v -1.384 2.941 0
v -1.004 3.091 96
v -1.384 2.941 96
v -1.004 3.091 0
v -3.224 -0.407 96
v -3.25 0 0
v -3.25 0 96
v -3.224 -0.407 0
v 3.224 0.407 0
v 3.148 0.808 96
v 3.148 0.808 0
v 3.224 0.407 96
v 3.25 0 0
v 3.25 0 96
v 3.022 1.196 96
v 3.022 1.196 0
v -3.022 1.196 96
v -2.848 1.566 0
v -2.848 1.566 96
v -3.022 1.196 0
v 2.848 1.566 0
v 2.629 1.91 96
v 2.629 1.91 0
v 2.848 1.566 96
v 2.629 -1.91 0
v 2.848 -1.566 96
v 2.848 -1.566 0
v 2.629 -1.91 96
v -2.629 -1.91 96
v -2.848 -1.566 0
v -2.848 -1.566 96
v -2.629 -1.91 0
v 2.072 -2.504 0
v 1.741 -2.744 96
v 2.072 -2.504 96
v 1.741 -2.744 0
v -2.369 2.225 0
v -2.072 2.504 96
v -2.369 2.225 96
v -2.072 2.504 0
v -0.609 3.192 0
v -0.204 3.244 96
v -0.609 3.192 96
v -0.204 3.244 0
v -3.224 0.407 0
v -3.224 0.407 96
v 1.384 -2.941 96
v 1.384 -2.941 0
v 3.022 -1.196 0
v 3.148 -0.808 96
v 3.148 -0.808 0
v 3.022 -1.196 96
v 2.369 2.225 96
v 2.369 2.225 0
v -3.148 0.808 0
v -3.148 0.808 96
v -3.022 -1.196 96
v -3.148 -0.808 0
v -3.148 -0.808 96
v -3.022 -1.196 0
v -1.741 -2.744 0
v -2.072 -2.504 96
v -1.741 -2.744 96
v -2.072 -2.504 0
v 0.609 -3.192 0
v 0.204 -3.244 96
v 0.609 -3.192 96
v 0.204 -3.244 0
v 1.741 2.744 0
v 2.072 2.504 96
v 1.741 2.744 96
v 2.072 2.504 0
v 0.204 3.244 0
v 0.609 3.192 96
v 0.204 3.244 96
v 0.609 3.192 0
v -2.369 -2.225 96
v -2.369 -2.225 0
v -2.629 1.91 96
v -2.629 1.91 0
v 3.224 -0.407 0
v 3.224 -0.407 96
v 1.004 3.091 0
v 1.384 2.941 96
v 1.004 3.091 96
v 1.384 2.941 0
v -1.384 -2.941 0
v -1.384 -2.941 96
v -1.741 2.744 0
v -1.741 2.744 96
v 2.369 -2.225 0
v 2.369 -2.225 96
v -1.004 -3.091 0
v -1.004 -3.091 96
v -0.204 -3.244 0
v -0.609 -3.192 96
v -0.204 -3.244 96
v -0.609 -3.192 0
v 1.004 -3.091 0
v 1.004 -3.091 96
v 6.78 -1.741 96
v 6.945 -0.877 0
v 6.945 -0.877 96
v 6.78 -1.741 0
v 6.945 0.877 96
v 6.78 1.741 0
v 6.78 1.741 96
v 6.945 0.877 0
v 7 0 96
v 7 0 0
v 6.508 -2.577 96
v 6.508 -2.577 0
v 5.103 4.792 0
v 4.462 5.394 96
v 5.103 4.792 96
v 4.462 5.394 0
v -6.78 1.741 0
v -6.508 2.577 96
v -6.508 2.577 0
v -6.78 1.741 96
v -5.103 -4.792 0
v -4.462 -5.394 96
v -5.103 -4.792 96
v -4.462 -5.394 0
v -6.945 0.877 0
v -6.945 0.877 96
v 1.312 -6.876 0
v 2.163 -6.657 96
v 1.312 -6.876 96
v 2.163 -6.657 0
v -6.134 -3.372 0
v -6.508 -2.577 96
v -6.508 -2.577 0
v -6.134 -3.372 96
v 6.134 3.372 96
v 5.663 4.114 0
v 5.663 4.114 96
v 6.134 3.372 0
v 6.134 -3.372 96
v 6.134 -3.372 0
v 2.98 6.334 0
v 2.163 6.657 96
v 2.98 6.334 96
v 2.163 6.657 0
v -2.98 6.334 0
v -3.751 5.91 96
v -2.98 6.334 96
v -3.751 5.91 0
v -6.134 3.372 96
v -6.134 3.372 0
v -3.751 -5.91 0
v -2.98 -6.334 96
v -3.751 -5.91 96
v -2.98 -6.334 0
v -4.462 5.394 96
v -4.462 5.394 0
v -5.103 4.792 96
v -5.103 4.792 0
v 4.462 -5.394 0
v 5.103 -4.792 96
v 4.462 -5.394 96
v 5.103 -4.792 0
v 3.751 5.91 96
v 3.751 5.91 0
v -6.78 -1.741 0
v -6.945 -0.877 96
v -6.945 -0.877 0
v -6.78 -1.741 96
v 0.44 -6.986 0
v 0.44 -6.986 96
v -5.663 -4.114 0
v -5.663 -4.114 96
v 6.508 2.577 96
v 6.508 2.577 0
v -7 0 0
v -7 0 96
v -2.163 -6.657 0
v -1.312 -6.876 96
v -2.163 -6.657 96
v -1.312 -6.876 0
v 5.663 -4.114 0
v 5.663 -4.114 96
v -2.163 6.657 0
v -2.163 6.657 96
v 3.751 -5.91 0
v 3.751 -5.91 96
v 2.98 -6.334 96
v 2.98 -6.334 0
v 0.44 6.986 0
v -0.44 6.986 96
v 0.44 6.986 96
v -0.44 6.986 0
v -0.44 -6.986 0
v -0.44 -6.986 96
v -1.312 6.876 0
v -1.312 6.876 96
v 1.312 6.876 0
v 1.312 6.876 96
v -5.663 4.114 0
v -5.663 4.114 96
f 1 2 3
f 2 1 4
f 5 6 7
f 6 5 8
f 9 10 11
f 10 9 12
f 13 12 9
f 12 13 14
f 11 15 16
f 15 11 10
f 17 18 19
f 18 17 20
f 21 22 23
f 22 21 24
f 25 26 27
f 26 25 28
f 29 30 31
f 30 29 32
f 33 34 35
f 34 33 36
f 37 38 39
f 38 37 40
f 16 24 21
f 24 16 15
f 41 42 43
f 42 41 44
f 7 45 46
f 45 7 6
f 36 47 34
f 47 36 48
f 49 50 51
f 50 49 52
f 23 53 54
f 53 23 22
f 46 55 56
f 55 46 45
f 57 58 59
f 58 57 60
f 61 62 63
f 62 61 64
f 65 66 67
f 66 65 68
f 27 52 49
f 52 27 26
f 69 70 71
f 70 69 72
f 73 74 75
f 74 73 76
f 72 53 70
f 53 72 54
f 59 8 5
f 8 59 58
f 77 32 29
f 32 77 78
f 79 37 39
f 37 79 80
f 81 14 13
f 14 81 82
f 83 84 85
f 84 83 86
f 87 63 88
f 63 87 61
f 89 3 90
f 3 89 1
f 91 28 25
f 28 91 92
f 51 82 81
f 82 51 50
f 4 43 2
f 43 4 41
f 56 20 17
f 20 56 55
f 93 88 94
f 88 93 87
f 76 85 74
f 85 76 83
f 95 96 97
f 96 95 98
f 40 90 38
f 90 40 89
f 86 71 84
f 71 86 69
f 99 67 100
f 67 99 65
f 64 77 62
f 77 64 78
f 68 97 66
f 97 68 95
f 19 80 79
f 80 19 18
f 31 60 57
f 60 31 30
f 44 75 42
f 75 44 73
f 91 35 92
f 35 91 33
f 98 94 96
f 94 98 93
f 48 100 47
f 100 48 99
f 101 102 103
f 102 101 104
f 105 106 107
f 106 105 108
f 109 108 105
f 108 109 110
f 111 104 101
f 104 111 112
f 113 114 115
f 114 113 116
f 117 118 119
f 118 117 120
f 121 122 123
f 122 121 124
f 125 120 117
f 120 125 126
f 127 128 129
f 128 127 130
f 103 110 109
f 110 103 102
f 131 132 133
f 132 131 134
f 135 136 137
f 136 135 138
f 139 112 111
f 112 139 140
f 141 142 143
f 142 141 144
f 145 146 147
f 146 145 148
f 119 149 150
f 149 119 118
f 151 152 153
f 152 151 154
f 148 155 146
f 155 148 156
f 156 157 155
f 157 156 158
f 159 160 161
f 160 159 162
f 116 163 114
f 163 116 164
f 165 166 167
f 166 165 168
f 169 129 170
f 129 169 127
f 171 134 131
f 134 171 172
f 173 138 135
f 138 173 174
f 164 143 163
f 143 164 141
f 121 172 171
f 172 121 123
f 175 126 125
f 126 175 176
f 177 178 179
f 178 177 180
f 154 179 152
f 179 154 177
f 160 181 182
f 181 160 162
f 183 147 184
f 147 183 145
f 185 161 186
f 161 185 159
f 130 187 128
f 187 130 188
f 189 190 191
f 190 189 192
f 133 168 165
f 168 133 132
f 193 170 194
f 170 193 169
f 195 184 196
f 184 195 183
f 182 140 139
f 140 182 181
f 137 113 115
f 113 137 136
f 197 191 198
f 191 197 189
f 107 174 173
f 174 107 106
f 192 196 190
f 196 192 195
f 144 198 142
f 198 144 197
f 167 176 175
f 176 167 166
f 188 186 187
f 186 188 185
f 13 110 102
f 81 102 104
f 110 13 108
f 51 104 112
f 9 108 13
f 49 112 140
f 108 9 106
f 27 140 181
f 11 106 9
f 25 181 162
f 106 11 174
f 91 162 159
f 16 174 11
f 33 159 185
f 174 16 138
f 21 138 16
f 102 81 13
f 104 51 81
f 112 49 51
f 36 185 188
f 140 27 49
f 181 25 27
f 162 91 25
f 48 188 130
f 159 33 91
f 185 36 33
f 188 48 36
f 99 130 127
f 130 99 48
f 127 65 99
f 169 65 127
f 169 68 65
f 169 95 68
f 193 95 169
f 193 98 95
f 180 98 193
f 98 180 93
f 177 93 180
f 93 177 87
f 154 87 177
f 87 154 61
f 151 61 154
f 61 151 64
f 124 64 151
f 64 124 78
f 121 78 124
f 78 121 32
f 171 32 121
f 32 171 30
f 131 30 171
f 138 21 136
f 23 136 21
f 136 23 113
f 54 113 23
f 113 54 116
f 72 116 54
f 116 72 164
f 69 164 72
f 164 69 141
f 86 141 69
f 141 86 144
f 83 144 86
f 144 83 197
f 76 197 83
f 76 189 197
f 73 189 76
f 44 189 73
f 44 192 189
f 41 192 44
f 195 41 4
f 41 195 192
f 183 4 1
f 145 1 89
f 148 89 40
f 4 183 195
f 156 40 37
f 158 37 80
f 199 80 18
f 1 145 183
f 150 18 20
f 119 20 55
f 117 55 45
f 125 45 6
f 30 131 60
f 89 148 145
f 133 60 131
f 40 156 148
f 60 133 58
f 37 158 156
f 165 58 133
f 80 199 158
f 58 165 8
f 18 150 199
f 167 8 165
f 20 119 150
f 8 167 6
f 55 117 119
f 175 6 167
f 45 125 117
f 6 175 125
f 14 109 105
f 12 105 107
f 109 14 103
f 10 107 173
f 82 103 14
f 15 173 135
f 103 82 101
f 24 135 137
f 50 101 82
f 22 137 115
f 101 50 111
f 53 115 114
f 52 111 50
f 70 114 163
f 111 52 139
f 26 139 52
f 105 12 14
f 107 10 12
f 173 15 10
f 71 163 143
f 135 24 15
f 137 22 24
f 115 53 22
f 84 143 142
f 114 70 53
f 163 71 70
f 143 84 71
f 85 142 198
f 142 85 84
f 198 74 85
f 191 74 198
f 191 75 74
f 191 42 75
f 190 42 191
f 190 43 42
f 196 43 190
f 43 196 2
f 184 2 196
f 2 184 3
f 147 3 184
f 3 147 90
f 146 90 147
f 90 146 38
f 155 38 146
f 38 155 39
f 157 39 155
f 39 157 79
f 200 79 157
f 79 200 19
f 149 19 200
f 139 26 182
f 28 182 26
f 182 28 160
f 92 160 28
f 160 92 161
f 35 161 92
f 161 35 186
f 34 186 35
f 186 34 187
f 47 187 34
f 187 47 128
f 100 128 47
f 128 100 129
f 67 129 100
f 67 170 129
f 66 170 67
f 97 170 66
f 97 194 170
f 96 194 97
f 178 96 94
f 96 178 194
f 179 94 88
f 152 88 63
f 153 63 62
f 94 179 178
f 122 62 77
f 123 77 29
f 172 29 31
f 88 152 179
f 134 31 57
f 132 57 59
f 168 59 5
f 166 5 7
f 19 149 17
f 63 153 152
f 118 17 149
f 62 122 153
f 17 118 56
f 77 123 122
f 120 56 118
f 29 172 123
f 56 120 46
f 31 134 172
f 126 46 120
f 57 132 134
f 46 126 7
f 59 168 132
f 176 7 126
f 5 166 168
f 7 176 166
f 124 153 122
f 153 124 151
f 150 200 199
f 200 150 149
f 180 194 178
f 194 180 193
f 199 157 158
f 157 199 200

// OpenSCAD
$fn = 50;


difference() {
	union() {
		cylinder(h = 96, r = 7.0000000000);
	}
	union() {
		translate(v = [0, 0, -100]) {
			cylinder(h = 200, r = 3.2500000000);
		}
		translate(v = [0, 0, -100]) {
			cylinder(h = 200, r = 1.8000000000);
		}
	}
}
